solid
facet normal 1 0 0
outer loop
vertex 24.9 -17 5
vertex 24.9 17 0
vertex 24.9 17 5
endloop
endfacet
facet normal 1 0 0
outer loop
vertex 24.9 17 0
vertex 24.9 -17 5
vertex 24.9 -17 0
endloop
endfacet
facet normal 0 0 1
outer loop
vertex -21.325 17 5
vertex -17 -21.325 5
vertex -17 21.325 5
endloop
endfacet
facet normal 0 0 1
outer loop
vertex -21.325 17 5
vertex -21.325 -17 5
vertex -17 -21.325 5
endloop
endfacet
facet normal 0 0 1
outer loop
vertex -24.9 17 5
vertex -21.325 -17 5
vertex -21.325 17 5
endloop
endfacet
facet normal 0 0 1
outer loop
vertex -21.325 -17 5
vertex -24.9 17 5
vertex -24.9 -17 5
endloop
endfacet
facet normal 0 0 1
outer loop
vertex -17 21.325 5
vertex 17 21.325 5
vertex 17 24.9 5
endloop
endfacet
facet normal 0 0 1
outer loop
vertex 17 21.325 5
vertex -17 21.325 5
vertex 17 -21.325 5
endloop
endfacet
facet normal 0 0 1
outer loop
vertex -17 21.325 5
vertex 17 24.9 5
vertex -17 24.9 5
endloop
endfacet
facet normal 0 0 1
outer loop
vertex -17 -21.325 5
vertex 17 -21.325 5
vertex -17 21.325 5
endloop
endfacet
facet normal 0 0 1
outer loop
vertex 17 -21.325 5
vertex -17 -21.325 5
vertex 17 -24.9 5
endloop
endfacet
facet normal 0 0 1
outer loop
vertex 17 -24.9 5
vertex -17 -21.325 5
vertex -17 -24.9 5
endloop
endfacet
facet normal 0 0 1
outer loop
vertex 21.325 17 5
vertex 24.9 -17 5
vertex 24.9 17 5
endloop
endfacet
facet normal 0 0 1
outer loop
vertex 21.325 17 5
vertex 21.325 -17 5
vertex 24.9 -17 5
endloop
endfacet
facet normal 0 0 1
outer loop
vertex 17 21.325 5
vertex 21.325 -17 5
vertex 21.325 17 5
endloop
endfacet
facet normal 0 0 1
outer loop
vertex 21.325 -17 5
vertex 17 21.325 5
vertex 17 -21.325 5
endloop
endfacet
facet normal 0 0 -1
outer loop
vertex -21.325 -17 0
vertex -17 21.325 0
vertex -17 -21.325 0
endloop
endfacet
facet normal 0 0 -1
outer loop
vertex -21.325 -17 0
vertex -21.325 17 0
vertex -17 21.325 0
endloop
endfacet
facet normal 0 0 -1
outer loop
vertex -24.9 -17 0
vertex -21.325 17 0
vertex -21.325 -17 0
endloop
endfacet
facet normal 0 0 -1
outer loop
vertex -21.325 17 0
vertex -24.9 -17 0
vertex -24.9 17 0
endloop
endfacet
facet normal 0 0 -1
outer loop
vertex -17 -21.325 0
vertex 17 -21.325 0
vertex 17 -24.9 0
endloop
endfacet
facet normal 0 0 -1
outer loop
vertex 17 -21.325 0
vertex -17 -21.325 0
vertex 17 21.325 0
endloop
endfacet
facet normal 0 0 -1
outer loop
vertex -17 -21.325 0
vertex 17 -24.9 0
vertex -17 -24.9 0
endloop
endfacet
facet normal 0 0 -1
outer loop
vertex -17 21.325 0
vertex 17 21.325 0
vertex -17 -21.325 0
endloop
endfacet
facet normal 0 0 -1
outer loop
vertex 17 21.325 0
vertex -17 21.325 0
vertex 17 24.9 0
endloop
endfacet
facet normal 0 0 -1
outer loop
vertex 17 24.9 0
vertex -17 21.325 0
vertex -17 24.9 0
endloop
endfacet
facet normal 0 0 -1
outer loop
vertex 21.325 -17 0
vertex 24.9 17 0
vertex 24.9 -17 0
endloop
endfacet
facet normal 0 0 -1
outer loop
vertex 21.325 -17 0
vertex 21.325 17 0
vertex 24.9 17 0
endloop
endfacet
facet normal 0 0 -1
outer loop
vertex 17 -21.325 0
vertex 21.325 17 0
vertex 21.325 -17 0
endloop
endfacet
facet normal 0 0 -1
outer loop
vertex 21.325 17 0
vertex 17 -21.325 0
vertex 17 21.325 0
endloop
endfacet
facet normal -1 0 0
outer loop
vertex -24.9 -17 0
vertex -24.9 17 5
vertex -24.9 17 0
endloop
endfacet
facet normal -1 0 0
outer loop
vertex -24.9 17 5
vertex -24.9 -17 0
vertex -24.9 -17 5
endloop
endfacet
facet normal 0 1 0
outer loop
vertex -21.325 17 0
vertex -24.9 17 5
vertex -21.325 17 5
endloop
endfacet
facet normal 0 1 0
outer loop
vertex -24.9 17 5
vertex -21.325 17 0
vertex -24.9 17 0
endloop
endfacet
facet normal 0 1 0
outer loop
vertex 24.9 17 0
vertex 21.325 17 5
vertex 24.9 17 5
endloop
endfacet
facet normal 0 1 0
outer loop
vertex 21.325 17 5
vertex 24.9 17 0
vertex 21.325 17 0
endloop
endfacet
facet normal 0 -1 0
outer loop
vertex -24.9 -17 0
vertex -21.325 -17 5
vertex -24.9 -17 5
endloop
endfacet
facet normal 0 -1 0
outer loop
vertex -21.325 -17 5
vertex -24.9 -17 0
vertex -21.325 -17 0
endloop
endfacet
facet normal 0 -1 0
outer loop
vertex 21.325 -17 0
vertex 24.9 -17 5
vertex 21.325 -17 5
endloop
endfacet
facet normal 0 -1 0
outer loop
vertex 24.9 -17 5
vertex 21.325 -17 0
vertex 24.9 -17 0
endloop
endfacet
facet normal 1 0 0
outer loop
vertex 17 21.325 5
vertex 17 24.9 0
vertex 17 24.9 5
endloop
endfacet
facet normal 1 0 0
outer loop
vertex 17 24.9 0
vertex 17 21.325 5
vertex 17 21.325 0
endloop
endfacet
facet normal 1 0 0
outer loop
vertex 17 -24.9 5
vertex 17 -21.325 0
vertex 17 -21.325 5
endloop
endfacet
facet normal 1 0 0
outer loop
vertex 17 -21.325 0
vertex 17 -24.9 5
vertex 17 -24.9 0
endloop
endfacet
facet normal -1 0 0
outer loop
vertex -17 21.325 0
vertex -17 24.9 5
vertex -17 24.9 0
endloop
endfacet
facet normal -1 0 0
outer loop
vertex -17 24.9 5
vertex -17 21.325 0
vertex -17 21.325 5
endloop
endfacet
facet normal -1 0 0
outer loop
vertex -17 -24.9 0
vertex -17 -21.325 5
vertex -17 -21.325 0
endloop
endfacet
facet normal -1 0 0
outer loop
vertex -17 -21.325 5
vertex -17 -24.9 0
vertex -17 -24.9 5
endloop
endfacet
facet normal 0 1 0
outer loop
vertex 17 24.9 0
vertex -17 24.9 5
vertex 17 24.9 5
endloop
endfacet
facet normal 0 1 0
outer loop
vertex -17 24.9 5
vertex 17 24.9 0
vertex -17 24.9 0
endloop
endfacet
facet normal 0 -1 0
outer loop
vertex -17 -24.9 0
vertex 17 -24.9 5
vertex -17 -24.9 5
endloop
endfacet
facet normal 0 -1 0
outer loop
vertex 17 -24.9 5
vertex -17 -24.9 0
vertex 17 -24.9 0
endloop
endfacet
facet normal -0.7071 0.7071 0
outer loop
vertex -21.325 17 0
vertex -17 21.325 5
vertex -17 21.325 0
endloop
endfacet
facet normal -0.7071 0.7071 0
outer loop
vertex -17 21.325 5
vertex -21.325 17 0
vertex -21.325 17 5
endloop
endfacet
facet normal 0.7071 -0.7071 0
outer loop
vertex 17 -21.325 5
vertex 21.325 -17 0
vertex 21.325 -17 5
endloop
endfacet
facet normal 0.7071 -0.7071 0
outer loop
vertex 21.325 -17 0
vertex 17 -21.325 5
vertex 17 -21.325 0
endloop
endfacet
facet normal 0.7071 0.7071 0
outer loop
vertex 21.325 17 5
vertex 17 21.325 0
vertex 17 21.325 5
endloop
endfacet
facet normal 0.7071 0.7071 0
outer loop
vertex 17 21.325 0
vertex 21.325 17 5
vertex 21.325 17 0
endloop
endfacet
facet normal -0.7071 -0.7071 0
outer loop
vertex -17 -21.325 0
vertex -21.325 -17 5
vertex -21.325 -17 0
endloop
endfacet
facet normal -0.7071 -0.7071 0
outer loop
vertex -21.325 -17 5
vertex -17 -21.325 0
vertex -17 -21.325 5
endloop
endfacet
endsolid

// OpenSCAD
//Cube insert template

/* [Hiden] */
a = 49.8;
b = 33.6;
c = 6.28;
d = 53.8;
h = 5; //holder height
IM_offset = 0.2;

module CubeInsert () {
    translate([0, 0, h/2])
    difference(){
        union() {   //basic insert design
            cube([a,b+2*IM_offset,h], center=true);
            cube([b+2*IM_offset,a,h], center=true);
            rotate(a=[0,0,45]){
                cube([c,d+2*IM_offset,h], center=true);
            }
            rotate(a=[0,0,-45]){
                cube([c,d+2*IM_offset,h], center=true);
            }
        }
    }
}

CubeInsert();
